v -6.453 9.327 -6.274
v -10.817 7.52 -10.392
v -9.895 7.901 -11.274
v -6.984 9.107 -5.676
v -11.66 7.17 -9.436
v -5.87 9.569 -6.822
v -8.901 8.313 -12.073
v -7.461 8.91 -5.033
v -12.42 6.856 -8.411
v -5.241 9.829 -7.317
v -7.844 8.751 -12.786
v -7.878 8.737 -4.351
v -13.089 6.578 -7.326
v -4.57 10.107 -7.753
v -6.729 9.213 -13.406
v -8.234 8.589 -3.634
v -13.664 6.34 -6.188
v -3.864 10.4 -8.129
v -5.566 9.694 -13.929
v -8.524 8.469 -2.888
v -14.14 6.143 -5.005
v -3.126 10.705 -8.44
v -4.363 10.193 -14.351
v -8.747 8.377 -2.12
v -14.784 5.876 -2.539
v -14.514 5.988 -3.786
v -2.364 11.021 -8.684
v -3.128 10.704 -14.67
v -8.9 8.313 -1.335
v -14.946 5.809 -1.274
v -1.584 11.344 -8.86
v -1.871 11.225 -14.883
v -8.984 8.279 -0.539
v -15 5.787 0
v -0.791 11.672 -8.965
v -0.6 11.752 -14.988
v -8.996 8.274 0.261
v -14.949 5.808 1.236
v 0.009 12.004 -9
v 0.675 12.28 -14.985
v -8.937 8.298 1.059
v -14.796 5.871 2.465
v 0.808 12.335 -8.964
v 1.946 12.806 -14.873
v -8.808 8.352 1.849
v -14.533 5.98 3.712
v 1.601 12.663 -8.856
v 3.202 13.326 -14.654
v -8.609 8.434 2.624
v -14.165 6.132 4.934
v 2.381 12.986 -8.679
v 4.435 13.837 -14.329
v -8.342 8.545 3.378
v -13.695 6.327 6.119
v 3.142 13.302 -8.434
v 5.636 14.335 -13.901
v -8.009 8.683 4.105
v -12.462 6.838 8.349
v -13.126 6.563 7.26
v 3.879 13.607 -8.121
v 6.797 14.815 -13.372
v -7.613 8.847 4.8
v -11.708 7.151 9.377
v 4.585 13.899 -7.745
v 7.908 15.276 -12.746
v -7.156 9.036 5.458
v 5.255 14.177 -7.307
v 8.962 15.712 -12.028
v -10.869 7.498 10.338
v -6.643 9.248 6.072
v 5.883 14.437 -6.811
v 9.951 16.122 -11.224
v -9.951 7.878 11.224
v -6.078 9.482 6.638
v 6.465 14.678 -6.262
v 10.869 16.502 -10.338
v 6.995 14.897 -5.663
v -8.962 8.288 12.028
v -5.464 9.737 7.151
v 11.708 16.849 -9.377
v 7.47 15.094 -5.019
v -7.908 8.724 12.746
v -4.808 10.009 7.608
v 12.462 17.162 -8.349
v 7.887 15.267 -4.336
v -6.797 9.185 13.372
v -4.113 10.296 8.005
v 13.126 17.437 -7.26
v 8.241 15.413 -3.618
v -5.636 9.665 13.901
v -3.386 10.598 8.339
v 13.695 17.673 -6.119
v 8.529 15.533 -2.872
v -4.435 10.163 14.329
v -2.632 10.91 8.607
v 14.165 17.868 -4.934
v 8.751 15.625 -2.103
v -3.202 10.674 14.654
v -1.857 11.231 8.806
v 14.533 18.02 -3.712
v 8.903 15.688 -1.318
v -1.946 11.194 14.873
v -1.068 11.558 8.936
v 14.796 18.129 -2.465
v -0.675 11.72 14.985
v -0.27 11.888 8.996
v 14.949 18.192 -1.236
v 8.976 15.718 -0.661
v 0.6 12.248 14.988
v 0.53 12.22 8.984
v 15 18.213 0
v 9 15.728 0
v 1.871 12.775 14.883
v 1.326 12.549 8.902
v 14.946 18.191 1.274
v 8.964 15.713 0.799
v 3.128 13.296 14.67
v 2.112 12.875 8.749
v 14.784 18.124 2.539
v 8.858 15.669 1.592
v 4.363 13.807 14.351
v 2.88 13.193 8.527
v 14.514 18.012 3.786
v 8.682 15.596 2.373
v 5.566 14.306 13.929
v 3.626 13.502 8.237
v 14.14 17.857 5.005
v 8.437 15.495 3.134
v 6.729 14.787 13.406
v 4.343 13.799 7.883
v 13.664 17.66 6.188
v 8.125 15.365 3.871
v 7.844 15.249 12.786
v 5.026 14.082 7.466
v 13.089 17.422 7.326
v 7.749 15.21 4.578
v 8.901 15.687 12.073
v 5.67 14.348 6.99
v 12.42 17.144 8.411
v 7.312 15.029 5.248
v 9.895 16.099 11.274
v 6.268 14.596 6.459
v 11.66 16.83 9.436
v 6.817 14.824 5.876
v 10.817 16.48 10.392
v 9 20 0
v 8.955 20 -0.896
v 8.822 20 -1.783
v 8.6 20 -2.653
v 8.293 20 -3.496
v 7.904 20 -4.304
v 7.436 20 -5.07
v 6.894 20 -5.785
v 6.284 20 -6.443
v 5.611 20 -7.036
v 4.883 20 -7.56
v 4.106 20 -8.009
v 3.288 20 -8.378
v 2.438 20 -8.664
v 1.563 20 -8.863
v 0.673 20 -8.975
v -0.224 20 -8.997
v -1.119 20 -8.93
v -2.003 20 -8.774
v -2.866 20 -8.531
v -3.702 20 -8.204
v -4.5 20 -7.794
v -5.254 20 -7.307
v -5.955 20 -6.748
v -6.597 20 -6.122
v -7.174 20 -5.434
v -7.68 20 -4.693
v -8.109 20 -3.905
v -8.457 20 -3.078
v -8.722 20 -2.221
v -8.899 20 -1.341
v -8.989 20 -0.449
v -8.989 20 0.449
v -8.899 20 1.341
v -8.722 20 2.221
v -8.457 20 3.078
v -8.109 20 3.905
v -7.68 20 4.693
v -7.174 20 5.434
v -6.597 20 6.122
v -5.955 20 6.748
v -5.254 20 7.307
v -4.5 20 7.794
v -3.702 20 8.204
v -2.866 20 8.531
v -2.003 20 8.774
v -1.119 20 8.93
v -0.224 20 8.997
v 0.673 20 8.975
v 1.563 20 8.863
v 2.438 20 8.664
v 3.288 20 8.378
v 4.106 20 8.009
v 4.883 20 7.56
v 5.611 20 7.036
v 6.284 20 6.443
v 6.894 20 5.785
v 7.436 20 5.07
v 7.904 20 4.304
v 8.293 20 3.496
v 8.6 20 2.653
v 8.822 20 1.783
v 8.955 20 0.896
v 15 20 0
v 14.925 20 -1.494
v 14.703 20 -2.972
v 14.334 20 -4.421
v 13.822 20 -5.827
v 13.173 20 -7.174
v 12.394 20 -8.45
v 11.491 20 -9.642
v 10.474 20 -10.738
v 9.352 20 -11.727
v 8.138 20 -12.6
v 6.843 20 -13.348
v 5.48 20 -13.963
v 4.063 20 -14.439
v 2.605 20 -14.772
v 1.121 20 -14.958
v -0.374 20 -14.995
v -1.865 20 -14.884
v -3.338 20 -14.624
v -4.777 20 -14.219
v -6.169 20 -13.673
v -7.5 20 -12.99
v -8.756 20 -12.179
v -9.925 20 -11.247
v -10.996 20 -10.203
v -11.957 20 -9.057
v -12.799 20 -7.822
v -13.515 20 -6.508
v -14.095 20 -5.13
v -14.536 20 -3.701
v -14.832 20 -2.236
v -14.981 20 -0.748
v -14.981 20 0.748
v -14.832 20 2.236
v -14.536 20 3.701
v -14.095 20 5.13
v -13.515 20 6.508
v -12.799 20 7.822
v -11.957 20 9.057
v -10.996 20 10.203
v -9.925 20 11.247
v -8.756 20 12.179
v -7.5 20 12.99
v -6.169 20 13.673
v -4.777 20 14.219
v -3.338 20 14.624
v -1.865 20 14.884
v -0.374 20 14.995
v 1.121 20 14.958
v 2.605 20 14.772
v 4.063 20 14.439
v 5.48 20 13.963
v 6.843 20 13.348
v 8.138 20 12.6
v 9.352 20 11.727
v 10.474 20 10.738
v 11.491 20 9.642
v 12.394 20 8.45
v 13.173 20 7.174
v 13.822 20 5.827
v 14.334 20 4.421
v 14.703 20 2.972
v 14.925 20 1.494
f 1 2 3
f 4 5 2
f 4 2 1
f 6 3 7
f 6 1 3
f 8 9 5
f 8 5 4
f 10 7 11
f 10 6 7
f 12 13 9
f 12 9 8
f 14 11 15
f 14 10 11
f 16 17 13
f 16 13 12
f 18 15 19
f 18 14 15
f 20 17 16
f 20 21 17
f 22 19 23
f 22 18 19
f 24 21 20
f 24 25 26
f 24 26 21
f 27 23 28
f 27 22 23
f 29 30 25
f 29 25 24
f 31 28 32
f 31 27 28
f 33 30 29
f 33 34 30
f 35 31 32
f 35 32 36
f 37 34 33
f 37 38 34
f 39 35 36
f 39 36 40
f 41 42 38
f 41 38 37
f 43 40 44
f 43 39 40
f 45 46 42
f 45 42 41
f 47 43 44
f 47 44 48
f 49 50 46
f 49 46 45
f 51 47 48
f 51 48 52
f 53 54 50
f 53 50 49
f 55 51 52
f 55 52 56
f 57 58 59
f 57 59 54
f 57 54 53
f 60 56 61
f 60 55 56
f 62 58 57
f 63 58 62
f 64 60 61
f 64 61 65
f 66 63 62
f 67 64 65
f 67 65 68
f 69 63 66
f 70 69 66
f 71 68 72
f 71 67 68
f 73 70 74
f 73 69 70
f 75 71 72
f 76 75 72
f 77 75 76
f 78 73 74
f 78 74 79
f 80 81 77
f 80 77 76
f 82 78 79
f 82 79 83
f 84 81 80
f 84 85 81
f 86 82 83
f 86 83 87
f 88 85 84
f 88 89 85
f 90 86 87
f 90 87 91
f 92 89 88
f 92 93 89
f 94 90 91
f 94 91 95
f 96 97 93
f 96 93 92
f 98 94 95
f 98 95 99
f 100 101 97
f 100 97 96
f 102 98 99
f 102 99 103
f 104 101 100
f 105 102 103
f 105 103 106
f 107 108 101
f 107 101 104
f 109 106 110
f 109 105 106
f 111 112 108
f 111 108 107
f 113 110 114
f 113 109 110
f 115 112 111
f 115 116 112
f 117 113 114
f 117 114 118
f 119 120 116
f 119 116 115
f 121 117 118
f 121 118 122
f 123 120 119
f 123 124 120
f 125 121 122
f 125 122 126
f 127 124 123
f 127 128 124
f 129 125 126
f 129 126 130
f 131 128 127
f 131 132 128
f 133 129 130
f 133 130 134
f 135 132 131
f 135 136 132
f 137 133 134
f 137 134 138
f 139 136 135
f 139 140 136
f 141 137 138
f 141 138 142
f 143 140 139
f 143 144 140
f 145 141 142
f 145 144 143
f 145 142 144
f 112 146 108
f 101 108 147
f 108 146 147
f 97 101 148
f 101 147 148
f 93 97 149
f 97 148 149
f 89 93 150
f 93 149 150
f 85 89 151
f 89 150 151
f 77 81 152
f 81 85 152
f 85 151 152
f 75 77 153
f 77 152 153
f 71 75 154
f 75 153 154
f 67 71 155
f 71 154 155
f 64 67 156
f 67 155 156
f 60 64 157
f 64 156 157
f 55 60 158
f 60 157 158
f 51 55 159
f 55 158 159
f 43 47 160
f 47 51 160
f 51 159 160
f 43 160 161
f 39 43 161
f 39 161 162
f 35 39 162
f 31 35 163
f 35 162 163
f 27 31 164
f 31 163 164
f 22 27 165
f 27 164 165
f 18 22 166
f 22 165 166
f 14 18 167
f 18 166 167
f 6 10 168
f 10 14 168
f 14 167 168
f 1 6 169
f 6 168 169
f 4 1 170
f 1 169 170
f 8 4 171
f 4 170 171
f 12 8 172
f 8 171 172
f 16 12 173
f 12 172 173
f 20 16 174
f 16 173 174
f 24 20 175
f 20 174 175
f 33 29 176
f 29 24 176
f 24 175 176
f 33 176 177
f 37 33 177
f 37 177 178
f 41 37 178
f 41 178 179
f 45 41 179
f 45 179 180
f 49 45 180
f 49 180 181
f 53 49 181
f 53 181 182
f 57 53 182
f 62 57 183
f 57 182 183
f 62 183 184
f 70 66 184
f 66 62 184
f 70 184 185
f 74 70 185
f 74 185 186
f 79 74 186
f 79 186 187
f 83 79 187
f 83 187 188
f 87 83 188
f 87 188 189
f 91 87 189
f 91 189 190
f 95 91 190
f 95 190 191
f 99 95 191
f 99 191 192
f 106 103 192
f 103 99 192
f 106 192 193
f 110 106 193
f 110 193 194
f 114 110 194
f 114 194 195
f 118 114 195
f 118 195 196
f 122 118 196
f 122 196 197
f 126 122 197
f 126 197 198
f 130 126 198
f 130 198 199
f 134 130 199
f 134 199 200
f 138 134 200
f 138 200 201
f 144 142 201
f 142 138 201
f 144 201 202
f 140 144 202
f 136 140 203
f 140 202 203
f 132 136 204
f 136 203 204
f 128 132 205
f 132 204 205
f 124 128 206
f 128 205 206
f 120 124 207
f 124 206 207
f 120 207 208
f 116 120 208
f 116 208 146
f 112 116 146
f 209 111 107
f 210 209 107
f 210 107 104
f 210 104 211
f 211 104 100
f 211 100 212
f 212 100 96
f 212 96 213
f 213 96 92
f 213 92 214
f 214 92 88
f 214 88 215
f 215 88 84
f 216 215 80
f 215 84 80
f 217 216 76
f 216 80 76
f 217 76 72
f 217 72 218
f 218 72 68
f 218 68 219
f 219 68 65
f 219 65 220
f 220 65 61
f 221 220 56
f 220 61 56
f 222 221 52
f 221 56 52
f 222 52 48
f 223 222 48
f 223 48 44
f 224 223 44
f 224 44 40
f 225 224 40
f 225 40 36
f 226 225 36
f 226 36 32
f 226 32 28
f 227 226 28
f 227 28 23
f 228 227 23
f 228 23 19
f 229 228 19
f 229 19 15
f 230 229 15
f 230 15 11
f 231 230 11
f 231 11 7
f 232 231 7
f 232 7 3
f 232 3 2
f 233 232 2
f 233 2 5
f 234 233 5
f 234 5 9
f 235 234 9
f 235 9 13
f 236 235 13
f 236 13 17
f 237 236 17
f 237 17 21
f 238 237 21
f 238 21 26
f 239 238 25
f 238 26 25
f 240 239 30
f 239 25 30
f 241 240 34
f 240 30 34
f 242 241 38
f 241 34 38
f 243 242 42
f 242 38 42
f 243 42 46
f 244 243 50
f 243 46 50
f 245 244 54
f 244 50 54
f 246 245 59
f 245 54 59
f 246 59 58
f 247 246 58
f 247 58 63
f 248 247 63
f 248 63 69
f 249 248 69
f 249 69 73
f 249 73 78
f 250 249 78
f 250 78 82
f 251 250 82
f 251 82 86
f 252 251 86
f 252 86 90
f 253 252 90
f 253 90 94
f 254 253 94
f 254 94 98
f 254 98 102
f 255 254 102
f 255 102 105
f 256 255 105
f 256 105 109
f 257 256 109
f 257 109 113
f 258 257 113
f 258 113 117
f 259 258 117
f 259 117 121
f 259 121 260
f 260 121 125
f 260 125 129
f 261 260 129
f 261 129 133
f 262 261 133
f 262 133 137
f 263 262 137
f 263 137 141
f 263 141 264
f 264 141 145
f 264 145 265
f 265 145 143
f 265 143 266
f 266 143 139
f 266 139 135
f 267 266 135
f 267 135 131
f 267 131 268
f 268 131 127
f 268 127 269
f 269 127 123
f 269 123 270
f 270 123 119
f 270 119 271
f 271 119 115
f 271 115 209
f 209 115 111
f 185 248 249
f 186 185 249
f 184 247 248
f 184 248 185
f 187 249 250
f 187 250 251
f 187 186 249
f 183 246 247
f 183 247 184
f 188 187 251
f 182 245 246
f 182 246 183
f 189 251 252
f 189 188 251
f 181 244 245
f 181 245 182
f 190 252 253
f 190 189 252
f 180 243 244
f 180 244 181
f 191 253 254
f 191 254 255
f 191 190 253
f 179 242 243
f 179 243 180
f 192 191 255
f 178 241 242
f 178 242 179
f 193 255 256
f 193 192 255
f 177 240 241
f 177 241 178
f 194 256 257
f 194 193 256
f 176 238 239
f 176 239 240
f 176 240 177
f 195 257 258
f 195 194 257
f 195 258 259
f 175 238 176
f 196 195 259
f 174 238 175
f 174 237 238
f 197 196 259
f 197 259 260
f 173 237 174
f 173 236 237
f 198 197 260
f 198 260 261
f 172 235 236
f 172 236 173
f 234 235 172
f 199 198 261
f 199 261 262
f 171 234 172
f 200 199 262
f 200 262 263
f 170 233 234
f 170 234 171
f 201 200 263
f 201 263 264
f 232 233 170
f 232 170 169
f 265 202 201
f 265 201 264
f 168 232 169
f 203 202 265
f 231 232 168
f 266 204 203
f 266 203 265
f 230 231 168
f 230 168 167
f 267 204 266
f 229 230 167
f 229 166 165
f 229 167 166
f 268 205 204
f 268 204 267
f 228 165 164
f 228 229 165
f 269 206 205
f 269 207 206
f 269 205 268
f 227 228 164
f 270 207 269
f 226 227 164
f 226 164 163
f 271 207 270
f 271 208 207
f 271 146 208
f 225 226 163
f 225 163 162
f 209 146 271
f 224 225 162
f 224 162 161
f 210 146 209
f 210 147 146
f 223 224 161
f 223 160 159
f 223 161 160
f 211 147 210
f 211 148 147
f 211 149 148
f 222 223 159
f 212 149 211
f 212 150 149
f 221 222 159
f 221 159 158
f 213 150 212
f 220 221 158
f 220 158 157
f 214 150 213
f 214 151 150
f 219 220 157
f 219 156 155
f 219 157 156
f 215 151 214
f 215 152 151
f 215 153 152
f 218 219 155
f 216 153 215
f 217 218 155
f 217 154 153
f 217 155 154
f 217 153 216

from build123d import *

# Parameters (mm, degrees)
SKETCH_1_R          = 15
EXTRUDE_1_DEPTH     = 20
CUT_EXTRUDE_1_DEPTH = 16.5
SKETCH_10_R         = 9
CUT_EXTRUDE_2_DEPTH = 24.5


with BuildPart() as part:
    # 草图1 → 凸台-拉伸1 (new body)
    with BuildSketch(Plane(origin=(0, 0, 0), x_dir=(1, 0, 0), z_dir=(0, 1, 0))):
        Circle(SKETCH_1_R)
    extrude(amount=EXTRUDE_1_DEPTH)

    # 草图2 → 切除-拉伸1 (cut, symmetric)
    with BuildSketch(Plane.XY):
        Polygon((-15, 5.786796564), (15, 18.213203436), (15, -10.377528432), (-15, -10.377528432), align=None)
    extrude(amount=CUT_EXTRUDE_1_DEPTH, both=True, mode=Mode.SUBTRACT)

    # 草图10 → 切除-拉伸2 (cut)
    with BuildSketch(Plane(origin=(0, 20, 0), x_dir=(1, 0, 0), z_dir=(0, 1, 0))):
        Circle(SKETCH_10_R)
    extrude(amount=-CUT_EXTRUDE_2_DEPTH, mode=Mode.SUBTRACT)


solid = part.part
